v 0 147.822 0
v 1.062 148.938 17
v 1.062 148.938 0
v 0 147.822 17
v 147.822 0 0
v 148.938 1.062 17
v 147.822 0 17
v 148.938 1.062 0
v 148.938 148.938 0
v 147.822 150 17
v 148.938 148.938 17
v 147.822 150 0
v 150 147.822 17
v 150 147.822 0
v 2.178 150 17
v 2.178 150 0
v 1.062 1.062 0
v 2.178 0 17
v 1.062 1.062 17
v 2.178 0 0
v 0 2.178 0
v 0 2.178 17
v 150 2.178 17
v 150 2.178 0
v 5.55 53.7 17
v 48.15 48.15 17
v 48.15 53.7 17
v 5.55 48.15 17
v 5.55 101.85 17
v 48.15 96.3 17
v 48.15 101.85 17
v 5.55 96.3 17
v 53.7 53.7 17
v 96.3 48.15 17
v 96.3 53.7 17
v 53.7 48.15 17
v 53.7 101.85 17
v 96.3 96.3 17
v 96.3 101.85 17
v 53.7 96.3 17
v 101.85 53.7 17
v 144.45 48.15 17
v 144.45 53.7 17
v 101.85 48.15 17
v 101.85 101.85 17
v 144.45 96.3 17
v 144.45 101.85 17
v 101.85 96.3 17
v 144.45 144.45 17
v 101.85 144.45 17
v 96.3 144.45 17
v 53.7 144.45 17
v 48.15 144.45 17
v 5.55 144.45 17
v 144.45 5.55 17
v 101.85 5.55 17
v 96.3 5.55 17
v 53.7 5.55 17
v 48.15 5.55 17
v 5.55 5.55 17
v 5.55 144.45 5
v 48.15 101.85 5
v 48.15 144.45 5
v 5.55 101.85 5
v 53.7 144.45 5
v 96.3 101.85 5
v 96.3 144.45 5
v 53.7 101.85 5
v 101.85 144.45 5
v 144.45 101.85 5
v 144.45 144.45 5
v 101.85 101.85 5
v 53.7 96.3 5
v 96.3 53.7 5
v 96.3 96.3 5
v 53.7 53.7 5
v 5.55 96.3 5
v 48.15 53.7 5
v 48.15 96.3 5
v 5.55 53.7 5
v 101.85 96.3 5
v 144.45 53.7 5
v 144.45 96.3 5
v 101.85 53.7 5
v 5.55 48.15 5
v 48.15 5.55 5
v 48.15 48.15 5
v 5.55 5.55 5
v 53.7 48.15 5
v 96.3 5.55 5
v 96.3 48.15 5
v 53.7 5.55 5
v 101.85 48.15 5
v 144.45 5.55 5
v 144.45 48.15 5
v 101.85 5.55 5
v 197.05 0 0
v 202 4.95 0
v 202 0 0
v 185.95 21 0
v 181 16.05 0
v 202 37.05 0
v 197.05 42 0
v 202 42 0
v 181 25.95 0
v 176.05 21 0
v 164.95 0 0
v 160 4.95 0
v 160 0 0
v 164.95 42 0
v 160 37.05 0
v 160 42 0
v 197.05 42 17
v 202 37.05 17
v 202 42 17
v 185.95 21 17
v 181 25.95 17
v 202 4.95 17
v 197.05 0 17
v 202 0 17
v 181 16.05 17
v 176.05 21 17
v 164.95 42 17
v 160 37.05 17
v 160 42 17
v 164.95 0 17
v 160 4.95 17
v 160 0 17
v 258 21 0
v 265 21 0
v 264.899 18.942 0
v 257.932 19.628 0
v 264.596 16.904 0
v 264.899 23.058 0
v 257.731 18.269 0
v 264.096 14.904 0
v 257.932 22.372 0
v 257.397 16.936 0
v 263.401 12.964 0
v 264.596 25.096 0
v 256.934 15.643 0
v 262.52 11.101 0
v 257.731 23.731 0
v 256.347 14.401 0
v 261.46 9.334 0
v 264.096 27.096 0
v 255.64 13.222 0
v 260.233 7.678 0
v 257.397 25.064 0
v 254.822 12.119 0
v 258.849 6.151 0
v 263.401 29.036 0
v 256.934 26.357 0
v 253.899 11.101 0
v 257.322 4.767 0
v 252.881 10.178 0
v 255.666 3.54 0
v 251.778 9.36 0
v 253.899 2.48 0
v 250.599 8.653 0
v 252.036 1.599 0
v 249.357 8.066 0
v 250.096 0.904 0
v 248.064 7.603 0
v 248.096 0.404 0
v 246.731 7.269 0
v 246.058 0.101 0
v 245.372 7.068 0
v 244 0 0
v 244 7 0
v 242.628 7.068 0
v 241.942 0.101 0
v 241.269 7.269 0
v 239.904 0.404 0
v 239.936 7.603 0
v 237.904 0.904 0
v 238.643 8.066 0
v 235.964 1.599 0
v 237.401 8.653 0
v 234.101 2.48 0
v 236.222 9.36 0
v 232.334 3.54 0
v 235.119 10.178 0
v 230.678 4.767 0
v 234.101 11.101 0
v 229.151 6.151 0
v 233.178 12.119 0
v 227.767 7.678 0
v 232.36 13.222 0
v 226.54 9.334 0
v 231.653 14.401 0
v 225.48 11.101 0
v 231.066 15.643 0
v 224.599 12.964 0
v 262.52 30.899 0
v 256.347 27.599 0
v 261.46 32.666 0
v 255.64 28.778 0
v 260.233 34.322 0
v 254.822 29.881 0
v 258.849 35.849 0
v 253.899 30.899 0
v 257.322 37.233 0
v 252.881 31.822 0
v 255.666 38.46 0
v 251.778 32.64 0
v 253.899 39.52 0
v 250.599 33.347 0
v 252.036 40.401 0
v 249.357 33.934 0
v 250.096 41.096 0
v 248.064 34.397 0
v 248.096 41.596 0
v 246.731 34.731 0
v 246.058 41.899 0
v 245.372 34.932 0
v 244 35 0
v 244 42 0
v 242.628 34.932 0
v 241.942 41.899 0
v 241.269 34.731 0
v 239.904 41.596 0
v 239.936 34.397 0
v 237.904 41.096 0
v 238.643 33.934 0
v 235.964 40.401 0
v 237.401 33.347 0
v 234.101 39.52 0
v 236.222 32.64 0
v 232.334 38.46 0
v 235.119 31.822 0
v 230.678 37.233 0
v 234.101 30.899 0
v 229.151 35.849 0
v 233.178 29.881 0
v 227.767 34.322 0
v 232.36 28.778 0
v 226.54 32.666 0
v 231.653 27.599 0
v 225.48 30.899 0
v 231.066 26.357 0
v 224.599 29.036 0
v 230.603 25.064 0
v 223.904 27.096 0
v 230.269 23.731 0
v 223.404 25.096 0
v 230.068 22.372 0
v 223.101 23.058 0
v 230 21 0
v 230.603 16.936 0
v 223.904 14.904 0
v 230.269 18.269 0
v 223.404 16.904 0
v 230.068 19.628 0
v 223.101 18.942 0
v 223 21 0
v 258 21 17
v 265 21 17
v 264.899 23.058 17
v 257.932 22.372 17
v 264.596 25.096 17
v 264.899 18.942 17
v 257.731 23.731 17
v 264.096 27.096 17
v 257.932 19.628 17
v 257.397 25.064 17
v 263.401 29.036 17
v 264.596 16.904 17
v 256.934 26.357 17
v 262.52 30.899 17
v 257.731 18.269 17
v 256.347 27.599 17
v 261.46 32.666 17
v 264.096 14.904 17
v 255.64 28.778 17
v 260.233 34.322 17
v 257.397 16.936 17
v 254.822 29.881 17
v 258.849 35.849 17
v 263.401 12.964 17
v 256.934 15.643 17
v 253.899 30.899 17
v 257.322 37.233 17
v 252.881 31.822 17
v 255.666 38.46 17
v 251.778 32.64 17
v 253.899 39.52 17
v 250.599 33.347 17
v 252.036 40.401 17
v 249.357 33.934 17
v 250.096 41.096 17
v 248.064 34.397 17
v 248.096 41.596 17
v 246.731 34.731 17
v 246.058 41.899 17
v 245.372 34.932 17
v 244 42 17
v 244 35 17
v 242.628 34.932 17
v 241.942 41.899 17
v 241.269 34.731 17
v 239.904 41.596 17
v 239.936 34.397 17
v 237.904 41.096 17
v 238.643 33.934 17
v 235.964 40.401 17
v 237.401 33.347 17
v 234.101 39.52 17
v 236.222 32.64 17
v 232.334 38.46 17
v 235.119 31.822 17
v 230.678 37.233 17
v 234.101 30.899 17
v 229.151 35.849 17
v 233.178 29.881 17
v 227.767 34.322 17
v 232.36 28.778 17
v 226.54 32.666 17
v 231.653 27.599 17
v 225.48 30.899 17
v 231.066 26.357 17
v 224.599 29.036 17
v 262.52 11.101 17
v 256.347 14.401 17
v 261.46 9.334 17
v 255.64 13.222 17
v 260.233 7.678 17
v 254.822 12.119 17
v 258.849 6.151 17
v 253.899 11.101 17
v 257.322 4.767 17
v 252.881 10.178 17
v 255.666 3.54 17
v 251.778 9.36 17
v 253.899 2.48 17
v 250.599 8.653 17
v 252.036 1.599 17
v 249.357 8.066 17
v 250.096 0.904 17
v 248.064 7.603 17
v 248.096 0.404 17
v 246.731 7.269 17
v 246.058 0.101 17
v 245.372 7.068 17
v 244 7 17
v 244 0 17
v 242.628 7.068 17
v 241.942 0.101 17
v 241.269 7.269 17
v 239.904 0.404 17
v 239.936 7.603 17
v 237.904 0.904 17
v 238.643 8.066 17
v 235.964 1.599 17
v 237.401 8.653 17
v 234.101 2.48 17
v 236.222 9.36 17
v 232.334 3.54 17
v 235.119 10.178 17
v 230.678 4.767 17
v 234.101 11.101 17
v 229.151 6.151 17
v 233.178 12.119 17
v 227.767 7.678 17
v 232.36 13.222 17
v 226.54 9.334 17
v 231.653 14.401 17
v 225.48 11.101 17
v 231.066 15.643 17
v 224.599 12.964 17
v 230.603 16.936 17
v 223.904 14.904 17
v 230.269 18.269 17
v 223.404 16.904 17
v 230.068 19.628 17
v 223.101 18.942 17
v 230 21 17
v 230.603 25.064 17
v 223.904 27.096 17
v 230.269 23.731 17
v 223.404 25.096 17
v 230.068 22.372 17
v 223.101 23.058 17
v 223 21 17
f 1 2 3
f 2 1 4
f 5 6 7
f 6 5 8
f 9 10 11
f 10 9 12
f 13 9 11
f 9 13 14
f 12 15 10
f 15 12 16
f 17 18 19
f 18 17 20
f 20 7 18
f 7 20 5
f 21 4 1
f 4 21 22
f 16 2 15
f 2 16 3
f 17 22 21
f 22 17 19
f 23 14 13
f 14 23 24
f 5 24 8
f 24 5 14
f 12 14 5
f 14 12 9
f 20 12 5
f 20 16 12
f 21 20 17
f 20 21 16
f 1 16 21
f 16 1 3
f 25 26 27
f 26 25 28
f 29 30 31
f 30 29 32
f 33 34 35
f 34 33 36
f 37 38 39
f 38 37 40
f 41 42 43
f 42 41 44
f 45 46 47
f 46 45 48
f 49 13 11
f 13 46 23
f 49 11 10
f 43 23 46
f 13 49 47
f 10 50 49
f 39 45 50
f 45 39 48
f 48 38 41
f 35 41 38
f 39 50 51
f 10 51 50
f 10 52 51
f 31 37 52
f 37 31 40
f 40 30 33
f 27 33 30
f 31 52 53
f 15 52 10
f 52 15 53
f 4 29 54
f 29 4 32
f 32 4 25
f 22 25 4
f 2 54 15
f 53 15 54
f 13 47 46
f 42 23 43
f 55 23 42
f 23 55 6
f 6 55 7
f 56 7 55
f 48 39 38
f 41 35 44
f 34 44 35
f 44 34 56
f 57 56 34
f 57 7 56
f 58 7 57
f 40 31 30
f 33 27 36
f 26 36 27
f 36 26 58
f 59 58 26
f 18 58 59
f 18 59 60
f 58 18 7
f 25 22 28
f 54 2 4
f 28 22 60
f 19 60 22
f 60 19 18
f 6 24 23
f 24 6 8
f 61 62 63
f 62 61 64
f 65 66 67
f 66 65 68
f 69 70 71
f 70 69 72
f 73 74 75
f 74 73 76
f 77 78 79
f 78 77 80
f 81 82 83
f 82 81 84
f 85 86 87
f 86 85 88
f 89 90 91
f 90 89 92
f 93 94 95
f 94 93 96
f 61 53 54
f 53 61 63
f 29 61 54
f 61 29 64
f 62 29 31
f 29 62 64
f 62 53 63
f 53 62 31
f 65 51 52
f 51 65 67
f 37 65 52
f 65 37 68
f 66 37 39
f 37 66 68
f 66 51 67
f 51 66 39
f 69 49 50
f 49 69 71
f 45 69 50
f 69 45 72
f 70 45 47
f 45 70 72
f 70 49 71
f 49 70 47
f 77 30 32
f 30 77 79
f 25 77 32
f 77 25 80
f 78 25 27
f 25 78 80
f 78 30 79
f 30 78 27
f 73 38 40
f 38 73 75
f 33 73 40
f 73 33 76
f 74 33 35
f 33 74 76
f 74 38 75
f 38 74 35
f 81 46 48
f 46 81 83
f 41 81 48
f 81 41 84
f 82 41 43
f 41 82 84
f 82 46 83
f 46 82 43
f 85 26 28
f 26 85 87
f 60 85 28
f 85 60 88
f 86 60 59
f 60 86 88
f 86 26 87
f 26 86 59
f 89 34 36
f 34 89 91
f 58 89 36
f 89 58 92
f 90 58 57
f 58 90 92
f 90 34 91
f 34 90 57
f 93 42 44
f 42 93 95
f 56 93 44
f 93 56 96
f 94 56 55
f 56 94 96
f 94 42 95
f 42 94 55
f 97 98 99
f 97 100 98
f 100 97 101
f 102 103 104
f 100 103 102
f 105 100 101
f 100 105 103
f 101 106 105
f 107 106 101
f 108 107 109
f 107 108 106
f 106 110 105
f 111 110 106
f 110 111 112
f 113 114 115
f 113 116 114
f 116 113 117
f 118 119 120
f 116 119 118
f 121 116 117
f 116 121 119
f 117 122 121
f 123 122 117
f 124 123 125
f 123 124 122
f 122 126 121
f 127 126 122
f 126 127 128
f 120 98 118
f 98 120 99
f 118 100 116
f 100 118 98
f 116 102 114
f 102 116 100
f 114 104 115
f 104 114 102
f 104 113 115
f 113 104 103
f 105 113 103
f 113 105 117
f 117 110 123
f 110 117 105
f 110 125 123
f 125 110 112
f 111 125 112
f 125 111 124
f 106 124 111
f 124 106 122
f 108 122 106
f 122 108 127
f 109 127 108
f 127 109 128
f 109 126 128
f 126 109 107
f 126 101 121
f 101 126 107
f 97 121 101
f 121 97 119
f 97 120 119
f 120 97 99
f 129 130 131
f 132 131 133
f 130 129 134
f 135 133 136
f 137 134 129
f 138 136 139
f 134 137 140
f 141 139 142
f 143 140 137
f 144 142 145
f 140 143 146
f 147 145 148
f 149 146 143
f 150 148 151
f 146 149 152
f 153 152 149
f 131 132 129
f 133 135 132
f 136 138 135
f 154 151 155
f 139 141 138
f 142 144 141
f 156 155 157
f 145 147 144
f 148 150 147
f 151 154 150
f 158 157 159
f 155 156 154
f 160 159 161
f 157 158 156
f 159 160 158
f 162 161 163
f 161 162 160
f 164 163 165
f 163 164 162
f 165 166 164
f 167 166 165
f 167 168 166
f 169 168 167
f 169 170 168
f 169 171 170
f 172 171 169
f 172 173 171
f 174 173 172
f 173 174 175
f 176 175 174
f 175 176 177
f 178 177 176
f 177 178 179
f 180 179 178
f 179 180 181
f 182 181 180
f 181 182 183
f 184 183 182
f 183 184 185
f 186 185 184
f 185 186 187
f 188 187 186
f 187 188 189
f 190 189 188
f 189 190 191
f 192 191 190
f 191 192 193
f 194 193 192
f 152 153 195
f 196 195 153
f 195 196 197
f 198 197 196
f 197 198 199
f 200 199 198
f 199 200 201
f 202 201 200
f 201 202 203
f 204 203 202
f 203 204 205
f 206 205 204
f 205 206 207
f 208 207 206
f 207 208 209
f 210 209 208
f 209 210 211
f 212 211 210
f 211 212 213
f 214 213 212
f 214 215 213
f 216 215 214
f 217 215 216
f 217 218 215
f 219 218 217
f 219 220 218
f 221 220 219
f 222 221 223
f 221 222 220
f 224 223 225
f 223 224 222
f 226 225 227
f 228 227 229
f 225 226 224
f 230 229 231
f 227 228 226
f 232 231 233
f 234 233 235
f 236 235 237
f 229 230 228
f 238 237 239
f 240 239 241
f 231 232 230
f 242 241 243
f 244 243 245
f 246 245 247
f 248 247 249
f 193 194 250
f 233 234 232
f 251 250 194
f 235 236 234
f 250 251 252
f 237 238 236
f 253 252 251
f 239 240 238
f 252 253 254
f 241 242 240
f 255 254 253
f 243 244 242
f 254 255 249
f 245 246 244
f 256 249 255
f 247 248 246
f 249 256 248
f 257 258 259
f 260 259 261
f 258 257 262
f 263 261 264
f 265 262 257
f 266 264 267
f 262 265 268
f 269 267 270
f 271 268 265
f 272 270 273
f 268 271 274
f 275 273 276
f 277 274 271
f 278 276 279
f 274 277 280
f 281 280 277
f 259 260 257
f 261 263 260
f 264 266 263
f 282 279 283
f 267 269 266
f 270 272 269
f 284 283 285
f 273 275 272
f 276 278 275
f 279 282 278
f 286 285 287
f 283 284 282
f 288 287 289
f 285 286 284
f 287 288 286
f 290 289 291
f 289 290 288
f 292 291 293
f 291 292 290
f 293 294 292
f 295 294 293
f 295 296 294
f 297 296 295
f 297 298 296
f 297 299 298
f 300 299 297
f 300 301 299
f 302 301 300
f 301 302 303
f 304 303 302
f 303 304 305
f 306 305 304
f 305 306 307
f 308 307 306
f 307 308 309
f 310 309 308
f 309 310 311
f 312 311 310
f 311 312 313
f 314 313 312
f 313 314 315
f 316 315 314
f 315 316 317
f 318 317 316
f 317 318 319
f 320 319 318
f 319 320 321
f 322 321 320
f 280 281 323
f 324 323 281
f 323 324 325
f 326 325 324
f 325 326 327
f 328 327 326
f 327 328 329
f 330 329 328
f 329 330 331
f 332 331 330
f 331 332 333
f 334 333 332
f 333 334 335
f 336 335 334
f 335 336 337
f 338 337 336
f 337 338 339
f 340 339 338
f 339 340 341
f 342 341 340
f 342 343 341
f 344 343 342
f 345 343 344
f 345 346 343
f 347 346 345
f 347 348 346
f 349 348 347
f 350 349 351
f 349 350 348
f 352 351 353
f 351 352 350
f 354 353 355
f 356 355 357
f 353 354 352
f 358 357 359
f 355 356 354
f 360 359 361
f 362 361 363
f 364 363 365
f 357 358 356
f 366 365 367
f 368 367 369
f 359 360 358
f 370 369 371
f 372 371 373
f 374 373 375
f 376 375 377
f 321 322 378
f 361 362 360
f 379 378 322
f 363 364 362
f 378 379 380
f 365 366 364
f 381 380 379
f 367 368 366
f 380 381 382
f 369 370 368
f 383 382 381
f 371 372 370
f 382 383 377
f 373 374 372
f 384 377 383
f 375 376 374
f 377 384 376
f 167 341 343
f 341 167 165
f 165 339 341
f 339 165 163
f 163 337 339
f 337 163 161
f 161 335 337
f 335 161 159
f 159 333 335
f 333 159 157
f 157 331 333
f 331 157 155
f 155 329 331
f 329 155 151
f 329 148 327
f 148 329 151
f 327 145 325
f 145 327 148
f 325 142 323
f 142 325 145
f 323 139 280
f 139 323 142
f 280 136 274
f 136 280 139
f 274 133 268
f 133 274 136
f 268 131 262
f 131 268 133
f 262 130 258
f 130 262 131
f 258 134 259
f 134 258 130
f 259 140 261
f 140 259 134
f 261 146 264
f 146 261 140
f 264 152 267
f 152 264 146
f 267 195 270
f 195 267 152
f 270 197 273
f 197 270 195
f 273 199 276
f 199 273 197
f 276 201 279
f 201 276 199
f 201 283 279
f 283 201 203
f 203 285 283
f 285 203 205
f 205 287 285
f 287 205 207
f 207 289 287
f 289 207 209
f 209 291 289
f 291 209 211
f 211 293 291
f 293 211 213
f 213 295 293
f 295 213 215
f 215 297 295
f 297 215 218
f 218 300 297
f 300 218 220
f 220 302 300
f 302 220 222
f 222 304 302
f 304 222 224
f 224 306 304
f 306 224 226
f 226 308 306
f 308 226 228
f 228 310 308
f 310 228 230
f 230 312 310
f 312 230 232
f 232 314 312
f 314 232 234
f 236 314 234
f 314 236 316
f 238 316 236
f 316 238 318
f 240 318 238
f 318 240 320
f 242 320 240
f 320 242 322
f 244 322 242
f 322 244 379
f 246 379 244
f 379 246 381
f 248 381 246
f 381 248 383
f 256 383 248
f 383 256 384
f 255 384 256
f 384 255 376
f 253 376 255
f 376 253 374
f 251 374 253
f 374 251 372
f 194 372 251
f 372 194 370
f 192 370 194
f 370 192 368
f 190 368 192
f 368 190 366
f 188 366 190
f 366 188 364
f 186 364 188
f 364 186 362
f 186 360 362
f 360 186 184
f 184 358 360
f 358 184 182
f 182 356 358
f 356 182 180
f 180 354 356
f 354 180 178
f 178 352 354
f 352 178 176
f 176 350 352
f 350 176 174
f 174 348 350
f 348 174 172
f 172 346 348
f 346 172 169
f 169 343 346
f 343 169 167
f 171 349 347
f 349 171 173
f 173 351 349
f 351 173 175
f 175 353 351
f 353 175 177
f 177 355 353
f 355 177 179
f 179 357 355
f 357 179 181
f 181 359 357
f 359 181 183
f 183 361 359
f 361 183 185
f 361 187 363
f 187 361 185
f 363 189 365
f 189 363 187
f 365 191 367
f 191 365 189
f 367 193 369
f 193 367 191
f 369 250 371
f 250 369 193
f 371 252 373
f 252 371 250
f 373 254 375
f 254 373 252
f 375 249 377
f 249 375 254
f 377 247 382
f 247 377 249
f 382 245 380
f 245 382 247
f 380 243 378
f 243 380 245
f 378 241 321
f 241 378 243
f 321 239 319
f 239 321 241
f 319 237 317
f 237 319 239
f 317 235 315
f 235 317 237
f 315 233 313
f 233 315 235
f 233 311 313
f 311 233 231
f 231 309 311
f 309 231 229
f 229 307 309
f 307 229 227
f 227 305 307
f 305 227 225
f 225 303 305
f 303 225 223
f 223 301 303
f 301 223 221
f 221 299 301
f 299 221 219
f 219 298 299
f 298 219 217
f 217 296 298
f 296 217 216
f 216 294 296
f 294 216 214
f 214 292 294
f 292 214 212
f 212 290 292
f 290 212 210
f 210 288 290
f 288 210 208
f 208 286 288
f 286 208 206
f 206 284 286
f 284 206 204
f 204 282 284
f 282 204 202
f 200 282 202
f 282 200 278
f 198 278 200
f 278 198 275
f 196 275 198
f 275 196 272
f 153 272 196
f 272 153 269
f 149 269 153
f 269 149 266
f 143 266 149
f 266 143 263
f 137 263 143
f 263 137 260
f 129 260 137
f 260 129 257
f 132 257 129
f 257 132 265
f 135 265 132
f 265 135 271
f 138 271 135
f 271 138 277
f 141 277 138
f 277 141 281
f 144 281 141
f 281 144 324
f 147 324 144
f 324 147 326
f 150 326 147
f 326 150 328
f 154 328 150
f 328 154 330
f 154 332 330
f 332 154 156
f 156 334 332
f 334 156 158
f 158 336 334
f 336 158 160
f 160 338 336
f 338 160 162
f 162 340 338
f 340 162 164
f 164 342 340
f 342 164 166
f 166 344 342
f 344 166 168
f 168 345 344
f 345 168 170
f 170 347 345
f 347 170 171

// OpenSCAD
union()
{
    difference()
    {
        linear_extrude(height = 17.0, twist = 0.0, scale = 1.0, slices = 1, center = false)
        {
            difference()
            {
                translate([75.0, 75.0])
                {
                    scale([150.0, 150.0])
                    {
                        M14();
                    }
                }
                translate([75.0, 75.0])
                {
                    difference()
                    {
                        scale([222.13203435596427, 222.13203435596427])
                        {
                            M201();
                        }
                        scale([209.13203435596427, 209.13203435596427])
                        {
                            M201();
                        }
                    }
                }
            }
        }
        translate([0.0, 0.0, 5.0])
        {
            linear_extrude(height = 12.0, twist = 0.0, scale = 1.0, slices = 1, center = false)
            {
                union()
                {
                    translate([5.549999999999997, 5.549999999999997])
                    {
                        translate([21.3, 21.3])
                        {
                            scale([42.6, 42.6])
                            {
                                M14();
                            }
                        }
                    }
                    translate([53.699999999999996, 5.549999999999997])
                    {
                        translate([21.3, 21.3])
                        {
                            scale([42.6, 42.6])
                            {
                                M14();
                            }
                        }
                    }
                    translate([101.85, 5.549999999999997])
                    {
                        translate([21.3, 21.3])
                        {
                            scale([42.6, 42.6])
                            {
                                M14();
                            }
                        }
                    }
                    translate([5.549999999999997, 53.699999999999996])
                    {
                        translate([21.3, 21.3])
                        {
                            scale([42.6, 42.6])
                            {
                                M14();
                            }
                        }
                    }
                    translate([53.699999999999996, 53.699999999999996])
                    {
                        translate([21.3, 21.3])
                        {
                            scale([42.6, 42.6])
                            {
                                M14();
                            }
                        }
                    }
                    translate([101.85, 53.699999999999996])
                    {
                        translate([21.3, 21.3])
                        {
                            scale([42.6, 42.6])
                            {
                                M14();
                            }
                        }
                    }
                    translate([5.549999999999997, 101.85])
                    {
                        translate([21.3, 21.3])
                        {
                            scale([42.6, 42.6])
                            {
                                M14();
                            }
                        }
                    }
                    translate([53.699999999999996, 101.85])
                    {
                        translate([21.3, 21.3])
                        {
                            scale([42.6, 42.6])
                            {
                                M14();
                            }
                        }
                    }
                    translate([101.85, 101.85])
                    {
                        translate([21.3, 21.3])
                        {
                            scale([42.6, 42.6])
                            {
                                M14();
                            }
                        }
                    }
                }
            }
        }
    }
    translate([181.0, 21.0, 0.0])
    {
        linear_extrude(height = 17.0, twist = 0.0, scale = 1.0, slices = 1, center = false)
        {
            intersection()
            {
                rotate(45.0)
                {
                    union()
                    {
                        scale([59.396969619669996, 7.0])
                        {
                            M14();
                        }
                        rotate(90.0)
                        {
                            scale([59.396969619669996, 7.0])
                            {
                                M14();
                            }
                        }
                    }
                }
                scale([42.0, 42.0])
                {
                    M14();
                }
            }
        }
    }
    translate([244.0, 21.0, 0.0])
    {
        linear_extrude(height = 17.0, twist = 0.0, scale = 1.0, slices = 1, center = false)
        {
            difference()
            {
                scale([42.0, 42.0])
                {
                    M104();
                }
                scale([28.0, 28.0])
                {
                    M104();
                }
            }
        }
    }
}

module M104()
{
    polygon
    (
        points =
        [
            [0.5, 0.0], 
            [0.49759236333609846, 0.0490085701647803], 
            [0.4903926402016152, 0.09754516100806412], 
            [0.4784701678661044, 0.14514233862723117], 
            [0.46193976625564337, 0.1913417161825449], 
            [0.4409606321741775, 0.23569836841299882], 
            [0.4157348061512726, 0.2777851165098011], 
            [0.3865052266813685, 0.31719664208182274], 
            [0.3535533905932738, 0.35355339059327373], 
            [0.31719664208182274, 0.38650522668136844], 
            [0.27778511650980114, 0.4157348061512726], 
            [0.2356983684129989, 0.44096063217417747], 
            [0.19134171618254492, 0.46193976625564337], 
            [0.14514233862723117, 0.4784701678661044], 
            [0.09754516100806417, 0.4903926402016152], 
            [0.049008570164780385, 0.49759236333609846], 
            [3.061616997868383E-17, 0.5], 
            [-0.04900857016478032, 0.49759236333609846], 
            [-0.0975451610080641, 0.4903926402016152], 
            [-0.14514233862723108, 0.47847016786610447], 
            [-0.19134171618254486, 0.46193976625564337], 
            [-0.23569836841299885, 0.4409606321741775], 
            [-0.277785116509801, 0.4157348061512727], 
            [-0.3171966420818227, 0.38650522668136855], 
            [-0.35355339059327373, 0.3535533905932738], 
            [-0.3865052266813685, 0.31719664208182274], 
            [-0.4157348061512727, 0.2777851165098011], 
            [-0.44096063217417747, 0.23569836841299893], 
            [-0.46193976625564337, 0.19134171618254495], 
            [-0.4784701678661044, 0.1451423386272312], 
            [-0.4903926402016152, 0.0975451610080643], 
            [-0.49759236333609846, 0.04900857016478041], 
            [-0.5, 6.123233995736766E-17], 
            [-0.49759236333609846, -0.049008570164780295], 
            [-0.4903926402016152, -0.09754516100806418], 
            [-0.47847016786610447, -0.14514233862723105], 
            [-0.46193976625564337, -0.1913417161825448], 
            [-0.4409606321741775, -0.23569836841299882], 
            [-0.41573480615127273, -0.277785116509801], 
            [-0.38650522668136855, -0.31719664208182263], 
            [-0.35355339059327384, -0.35355339059327373], 
            [-0.31719664208182297, -0.38650522668136833], 
            [-0.2777851165098011, -0.4157348061512726], 
            [-0.23569836841299896, -0.44096063217417747], 
            [-0.19134171618254517, -0.46193976625564326], 
            [-0.14514233862723122, -0.4784701678661044], 
            [-0.09754516100806433, -0.4903926402016152], 
            [-0.049008570164780225, -0.49759236333609846], 
            [-9.184850993605148E-17, -0.5], 
            [0.049008570164780045, -0.49759236333609846], 
            [0.09754516100806415, -0.4903926402016152], 
            [0.14514233862723103, -0.47847016786610447], 
            [0.191341716182545, -0.4619397662556433], 
            [0.2356983684129988, -0.4409606321741775], 
            [0.2777851165098009, -0.41573480615127273], 
            [0.3171966420818228, -0.38650522668136844], 
            [0.3535533905932737, -0.35355339059327384], 
            [0.3865052266813683, -0.31719664208182297], 
            [0.4157348061512726, -0.2777851165098011], 
            [0.4409606321741774, -0.23569836841299896], 
            [0.46193976625564326, -0.1913417161825452], 
            [0.4784701678661044, -0.14514233862723125], 
            [0.49039264020161516, -0.09754516100806436], 
            [0.49759236333609846, -0.04900857016478025]
        ],
        paths =
        [
            [0, 1, 2, 3, 4, 5, 6, 7, 8, 9, 10, 11, 12, 13, 14, 15, 16, 17, 18, 19, 20, 21, 22, 23, 24, 25, 26, 27, 28, 29, 30, 31, 32, 33, 34, 35, 36, 37, 38, 39, 40, 41, 42, 43, 44, 45, 46, 47, 48, 49, 50, 51, 52, 53, 54, 55, 56, 57, 58, 59, 60, 61, 62, 63]
        ]
    );
}

module M201()
{
    polygon
    (
        points =
        [
            [0.5, 0.0], 
            [0.4993977281025862, 0.024533837163709007], 
            [0.49759236333609846, 0.0490085701647803], 
            [0.4945882549823905, 0.07336523722768087], 
            [0.4903926402016152, 0.09754516100806412], 
            [0.485015626597272, 0.12149008995163194], 
            [0.4784701678661044, 0.14514233862723117], 
            [0.4707720325915104, 0.16844492669611003], 
            [0.46193976625564337, 0.1913417161825449], 
            [0.45199464656172167, 0.21377754671514104], 
            [0.4409606321741775, 0.23569836841299882], 
            [0.42886430500013606, 0.25705137209661083], 
            [0.4157348061512726, 0.2777851165098011], 
            [0.40160376574032247, 0.2978496522462167], 
            [0.3865052266813685, 0.31719664208182274], 
            [0.3704755626774796, 0.33577947742350917], 
            [0.3535533905932738, 0.35355339059327373], 
            [0.33577947742350917, 0.37047556267747955], 
            [0.31719664208182274, 0.38650522668136844], 
            [0.29784965224621673, 0.4016037657403224], 
            [0.27778511650980114, 0.4157348061512726], 
            [0.25705137209661083, 0.42886430500013606], 
            [0.2356983684129989, 0.44096063217417747], 
            [0.2137775467151411, 0.4519946465617216], 
            [0.19134171618254492, 0.46193976625564337], 
            [0.16844492669611003, 0.4707720325915104], 
            [0.14514233862723117, 0.4784701678661044], 
            [0.12149008995163199, 0.485015626597272], 
            [0.09754516100806417, 0.4903926402016152], 
            [0.07336523722768087, 0.49458825498239045], 
            [0.049008570164780385, 0.49759236333609846], 
            [0.024533837163709063, 0.4993977281025862], 
            [3.061616997868383E-17, 0.5], 
            [-0.024533837163709004, 0.4993977281025862], 
            [-0.04900857016478032, 0.49759236333609846], 
            [-0.07336523722768082, 0.4945882549823905], 
            [-0.0975451610080641, 0.4903926402016152], 
            [-0.12149008995163194, 0.485015626597272], 
            [-0.14514233862723108, 0.47847016786610447], 
            [-0.16844492669610997, 0.4707720325915104], 
            [-0.19134171618254486, 0.46193976625564337], 
            [-0.21377754671514093, 0.4519946465617217], 
            [-0.23569836841299885, 0.4409606321741775], 
            [-0.2570513720966108, 0.42886430500013606], 
            [-0.277785116509801, 0.4157348061512727], 
            [-0.2978496522462167, 0.40160376574032247], 
            [-0.3171966420818227, 0.38650522668136855], 
            [-0.3357794774235092, 0.3704755626774795], 
            [-0.35355339059327373, 0.3535533905932738], 
            [-0.37047556267747944, 0.3357794774235093], 
            [-0.3865052266813685, 0.31719664208182274], 
            [-0.4016037657403224, 0.29784965224621673], 
            [-0.4157348061512727, 0.2777851165098011], 
            [-0.428864305000136, 0.2570513720966109], 
            [-0.44096063217417747, 0.23569836841299893], 
            [-0.45199464656172167, 0.21377754671514101], 
            [-0.46193976625564337, 0.19134171618254495], 
            [-0.47077203259151035, 0.16844492669611016], 
            [-0.4784701678661044, 0.1451423386272312], 
            [-0.485015626597272, 0.12149008995163203], 
            [-0.4903926402016152, 0.0975451610080643], 
            [-0.49458825498239045, 0.0733652372276809], 
            [-0.49759236333609846, 0.04900857016478041], 
            [-0.4993977281025862, 0.024533837163708983], 
            [-0.5, 6.123233995736766E-17], 
            [-0.4993977281025862, -0.024533837163708862], 
            [-0.49759236333609846, -0.049008570164780295], 
            [-0.4945882549823905, -0.07336523722768079], 
            [-0.4903926402016152, -0.09754516100806418], 
            [-0.48501562659727204, -0.12149008995163191], 
            [-0.47847016786610447, -0.14514233862723105], 
            [-0.47077203259151035, -0.16844492669611003], 
            [-0.46193976625564337, -0.1913417161825448], 
            [-0.4519946465617217, -0.2137775467151409], 
            [-0.4409606321741775, -0.23569836841299882], 
            [-0.42886430500013606, -0.2570513720966108], 
            [-0.41573480615127273, -0.277785116509801], 
            [-0.40160376574032247, -0.2978496522462166], 
            [-0.38650522668136855, -0.31719664208182263], 
            [-0.37047556267747955, -0.3357794774235092], 
            [-0.35355339059327384, -0.35355339059327373], 
            [-0.33577947742350933, -0.37047556267747944], 
            [-0.31719664208182297, -0.38650522668136833], 
            [-0.29784965224621657, -0.4016037657403225], 
            [-0.2777851165098011, -0.4157348061512726], 
            [-0.2570513720966109, -0.428864305000136], 
            [-0.23569836841299896, -0.44096063217417747], 
            [-0.21377754671514124, -0.45199464656172156], 
            [-0.19134171618254517, -0.46193976625564326], 
            [-0.16844492669610997, -0.4707720325915104], 
            [-0.14514233862723122, -0.4784701678661044], 
            [-0.12149008995163206, -0.48501562659727193], 
            [-0.09754516100806433, -0.4903926402016152], 
            [-0.07336523722768115, -0.49458825498239045], 
            [-0.049008570164780225, -0.49759236333609846], 
            [-0.024533837163709014, -0.4993977281025862], 
            [-9.184850993605148E-17, -0.5], 
            [0.02453383716370883, -0.4993977281025862], 
            [0.049008570164780045, -0.49759236333609846], 
            [0.07336523722768097, -0.49458825498239045], 
            [0.09754516100806415, -0.4903926402016152], 
            [0.12149008995163188, -0.48501562659727204], 
            [0.14514233862723103, -0.47847016786610447], 
            [0.1684449266961098, -0.47077203259151046], 
            [0.191341716182545, -0.4619397662556433], 
            [0.21377754671514107, -0.45199464656172167], 
            [0.2356983684129988, -0.4409606321741775], 
            [0.2570513720966108, -0.4288643050001361], 
            [0.2777851165098009, -0.41573480615127273], 
            [0.2978496522462164, -0.40160376574032264], 
            [0.3171966420818228, -0.38650522668136844], 
            [0.33577947742350917, -0.37047556267747955], 
            [0.3535533905932737, -0.35355339059327384], 
            [0.37047556267747944, -0.33577947742350933], 
            [0.3865052266813683, -0.31719664208182297], 
            [0.4016037657403225, -0.2978496522462166], 
            [0.4157348061512726, -0.2777851165098011], 
            [0.428864305000136, -0.25705137209661094], 
            [0.4409606321741774, -0.23569836841299896], 
            [0.45199464656172156, -0.21377754671514126], 
            [0.46193976625564326, -0.1913417161825452], 
            [0.4707720325915104, -0.16844492669611], 
            [0.4784701678661044, -0.14514233862723125], 
            [0.48501562659727193, -0.12149008995163209], 
            [0.49039264020161516, -0.09754516100806436], 
            [0.49458825498239045, -0.0733652372276812], 
            [0.49759236333609846, -0.04900857016478025], 
            [0.4993977281025862, -0.024533837163709046]
        ],
        paths =
        [
            [0, 1, 2, 3, 4, 5, 6, 7, 8, 9, 10, 11, 12, 13, 14, 15, 16, 17, 18, 19, 20, 21, 22, 23, 24, 25, 26, 27, 28, 29, 30, 31, 32, 33, 34, 35, 36, 37, 38, 39, 40, 41, 42, 43, 44, 45, 46, 47, 48, 49, 50, 51, 52, 53, 54, 55, 56, 57, 58, 59, 60, 61, 62, 63, 64, 65, 66, 67, 68, 69, 70, 71, 72, 73, 74, 75, 76, 77, 78, 79, 80, 81, 82, 83, 84, 85, 86, 87, 88, 89, 90, 91, 92, 93, 94, 95, 96, 97, 98, 99, 100, 101, 102, 103, 104, 105, 106, 107, 108, 109, 110, 111, 112, 113, 114, 115, 116, 117, 118, 119, 120, 121, 122, 123, 124, 125, 126, 127]
        ]
    );
}

module M14()
{
    polygon
    (
        points =
        [
            [-0.5, -0.5], 
            [0.5, -0.5], 
            [0.5, 0.5], 
            [-0.5, 0.5]
        ],
        paths =
        [
            [0, 1, 2, 3]
        ]
    );
}
